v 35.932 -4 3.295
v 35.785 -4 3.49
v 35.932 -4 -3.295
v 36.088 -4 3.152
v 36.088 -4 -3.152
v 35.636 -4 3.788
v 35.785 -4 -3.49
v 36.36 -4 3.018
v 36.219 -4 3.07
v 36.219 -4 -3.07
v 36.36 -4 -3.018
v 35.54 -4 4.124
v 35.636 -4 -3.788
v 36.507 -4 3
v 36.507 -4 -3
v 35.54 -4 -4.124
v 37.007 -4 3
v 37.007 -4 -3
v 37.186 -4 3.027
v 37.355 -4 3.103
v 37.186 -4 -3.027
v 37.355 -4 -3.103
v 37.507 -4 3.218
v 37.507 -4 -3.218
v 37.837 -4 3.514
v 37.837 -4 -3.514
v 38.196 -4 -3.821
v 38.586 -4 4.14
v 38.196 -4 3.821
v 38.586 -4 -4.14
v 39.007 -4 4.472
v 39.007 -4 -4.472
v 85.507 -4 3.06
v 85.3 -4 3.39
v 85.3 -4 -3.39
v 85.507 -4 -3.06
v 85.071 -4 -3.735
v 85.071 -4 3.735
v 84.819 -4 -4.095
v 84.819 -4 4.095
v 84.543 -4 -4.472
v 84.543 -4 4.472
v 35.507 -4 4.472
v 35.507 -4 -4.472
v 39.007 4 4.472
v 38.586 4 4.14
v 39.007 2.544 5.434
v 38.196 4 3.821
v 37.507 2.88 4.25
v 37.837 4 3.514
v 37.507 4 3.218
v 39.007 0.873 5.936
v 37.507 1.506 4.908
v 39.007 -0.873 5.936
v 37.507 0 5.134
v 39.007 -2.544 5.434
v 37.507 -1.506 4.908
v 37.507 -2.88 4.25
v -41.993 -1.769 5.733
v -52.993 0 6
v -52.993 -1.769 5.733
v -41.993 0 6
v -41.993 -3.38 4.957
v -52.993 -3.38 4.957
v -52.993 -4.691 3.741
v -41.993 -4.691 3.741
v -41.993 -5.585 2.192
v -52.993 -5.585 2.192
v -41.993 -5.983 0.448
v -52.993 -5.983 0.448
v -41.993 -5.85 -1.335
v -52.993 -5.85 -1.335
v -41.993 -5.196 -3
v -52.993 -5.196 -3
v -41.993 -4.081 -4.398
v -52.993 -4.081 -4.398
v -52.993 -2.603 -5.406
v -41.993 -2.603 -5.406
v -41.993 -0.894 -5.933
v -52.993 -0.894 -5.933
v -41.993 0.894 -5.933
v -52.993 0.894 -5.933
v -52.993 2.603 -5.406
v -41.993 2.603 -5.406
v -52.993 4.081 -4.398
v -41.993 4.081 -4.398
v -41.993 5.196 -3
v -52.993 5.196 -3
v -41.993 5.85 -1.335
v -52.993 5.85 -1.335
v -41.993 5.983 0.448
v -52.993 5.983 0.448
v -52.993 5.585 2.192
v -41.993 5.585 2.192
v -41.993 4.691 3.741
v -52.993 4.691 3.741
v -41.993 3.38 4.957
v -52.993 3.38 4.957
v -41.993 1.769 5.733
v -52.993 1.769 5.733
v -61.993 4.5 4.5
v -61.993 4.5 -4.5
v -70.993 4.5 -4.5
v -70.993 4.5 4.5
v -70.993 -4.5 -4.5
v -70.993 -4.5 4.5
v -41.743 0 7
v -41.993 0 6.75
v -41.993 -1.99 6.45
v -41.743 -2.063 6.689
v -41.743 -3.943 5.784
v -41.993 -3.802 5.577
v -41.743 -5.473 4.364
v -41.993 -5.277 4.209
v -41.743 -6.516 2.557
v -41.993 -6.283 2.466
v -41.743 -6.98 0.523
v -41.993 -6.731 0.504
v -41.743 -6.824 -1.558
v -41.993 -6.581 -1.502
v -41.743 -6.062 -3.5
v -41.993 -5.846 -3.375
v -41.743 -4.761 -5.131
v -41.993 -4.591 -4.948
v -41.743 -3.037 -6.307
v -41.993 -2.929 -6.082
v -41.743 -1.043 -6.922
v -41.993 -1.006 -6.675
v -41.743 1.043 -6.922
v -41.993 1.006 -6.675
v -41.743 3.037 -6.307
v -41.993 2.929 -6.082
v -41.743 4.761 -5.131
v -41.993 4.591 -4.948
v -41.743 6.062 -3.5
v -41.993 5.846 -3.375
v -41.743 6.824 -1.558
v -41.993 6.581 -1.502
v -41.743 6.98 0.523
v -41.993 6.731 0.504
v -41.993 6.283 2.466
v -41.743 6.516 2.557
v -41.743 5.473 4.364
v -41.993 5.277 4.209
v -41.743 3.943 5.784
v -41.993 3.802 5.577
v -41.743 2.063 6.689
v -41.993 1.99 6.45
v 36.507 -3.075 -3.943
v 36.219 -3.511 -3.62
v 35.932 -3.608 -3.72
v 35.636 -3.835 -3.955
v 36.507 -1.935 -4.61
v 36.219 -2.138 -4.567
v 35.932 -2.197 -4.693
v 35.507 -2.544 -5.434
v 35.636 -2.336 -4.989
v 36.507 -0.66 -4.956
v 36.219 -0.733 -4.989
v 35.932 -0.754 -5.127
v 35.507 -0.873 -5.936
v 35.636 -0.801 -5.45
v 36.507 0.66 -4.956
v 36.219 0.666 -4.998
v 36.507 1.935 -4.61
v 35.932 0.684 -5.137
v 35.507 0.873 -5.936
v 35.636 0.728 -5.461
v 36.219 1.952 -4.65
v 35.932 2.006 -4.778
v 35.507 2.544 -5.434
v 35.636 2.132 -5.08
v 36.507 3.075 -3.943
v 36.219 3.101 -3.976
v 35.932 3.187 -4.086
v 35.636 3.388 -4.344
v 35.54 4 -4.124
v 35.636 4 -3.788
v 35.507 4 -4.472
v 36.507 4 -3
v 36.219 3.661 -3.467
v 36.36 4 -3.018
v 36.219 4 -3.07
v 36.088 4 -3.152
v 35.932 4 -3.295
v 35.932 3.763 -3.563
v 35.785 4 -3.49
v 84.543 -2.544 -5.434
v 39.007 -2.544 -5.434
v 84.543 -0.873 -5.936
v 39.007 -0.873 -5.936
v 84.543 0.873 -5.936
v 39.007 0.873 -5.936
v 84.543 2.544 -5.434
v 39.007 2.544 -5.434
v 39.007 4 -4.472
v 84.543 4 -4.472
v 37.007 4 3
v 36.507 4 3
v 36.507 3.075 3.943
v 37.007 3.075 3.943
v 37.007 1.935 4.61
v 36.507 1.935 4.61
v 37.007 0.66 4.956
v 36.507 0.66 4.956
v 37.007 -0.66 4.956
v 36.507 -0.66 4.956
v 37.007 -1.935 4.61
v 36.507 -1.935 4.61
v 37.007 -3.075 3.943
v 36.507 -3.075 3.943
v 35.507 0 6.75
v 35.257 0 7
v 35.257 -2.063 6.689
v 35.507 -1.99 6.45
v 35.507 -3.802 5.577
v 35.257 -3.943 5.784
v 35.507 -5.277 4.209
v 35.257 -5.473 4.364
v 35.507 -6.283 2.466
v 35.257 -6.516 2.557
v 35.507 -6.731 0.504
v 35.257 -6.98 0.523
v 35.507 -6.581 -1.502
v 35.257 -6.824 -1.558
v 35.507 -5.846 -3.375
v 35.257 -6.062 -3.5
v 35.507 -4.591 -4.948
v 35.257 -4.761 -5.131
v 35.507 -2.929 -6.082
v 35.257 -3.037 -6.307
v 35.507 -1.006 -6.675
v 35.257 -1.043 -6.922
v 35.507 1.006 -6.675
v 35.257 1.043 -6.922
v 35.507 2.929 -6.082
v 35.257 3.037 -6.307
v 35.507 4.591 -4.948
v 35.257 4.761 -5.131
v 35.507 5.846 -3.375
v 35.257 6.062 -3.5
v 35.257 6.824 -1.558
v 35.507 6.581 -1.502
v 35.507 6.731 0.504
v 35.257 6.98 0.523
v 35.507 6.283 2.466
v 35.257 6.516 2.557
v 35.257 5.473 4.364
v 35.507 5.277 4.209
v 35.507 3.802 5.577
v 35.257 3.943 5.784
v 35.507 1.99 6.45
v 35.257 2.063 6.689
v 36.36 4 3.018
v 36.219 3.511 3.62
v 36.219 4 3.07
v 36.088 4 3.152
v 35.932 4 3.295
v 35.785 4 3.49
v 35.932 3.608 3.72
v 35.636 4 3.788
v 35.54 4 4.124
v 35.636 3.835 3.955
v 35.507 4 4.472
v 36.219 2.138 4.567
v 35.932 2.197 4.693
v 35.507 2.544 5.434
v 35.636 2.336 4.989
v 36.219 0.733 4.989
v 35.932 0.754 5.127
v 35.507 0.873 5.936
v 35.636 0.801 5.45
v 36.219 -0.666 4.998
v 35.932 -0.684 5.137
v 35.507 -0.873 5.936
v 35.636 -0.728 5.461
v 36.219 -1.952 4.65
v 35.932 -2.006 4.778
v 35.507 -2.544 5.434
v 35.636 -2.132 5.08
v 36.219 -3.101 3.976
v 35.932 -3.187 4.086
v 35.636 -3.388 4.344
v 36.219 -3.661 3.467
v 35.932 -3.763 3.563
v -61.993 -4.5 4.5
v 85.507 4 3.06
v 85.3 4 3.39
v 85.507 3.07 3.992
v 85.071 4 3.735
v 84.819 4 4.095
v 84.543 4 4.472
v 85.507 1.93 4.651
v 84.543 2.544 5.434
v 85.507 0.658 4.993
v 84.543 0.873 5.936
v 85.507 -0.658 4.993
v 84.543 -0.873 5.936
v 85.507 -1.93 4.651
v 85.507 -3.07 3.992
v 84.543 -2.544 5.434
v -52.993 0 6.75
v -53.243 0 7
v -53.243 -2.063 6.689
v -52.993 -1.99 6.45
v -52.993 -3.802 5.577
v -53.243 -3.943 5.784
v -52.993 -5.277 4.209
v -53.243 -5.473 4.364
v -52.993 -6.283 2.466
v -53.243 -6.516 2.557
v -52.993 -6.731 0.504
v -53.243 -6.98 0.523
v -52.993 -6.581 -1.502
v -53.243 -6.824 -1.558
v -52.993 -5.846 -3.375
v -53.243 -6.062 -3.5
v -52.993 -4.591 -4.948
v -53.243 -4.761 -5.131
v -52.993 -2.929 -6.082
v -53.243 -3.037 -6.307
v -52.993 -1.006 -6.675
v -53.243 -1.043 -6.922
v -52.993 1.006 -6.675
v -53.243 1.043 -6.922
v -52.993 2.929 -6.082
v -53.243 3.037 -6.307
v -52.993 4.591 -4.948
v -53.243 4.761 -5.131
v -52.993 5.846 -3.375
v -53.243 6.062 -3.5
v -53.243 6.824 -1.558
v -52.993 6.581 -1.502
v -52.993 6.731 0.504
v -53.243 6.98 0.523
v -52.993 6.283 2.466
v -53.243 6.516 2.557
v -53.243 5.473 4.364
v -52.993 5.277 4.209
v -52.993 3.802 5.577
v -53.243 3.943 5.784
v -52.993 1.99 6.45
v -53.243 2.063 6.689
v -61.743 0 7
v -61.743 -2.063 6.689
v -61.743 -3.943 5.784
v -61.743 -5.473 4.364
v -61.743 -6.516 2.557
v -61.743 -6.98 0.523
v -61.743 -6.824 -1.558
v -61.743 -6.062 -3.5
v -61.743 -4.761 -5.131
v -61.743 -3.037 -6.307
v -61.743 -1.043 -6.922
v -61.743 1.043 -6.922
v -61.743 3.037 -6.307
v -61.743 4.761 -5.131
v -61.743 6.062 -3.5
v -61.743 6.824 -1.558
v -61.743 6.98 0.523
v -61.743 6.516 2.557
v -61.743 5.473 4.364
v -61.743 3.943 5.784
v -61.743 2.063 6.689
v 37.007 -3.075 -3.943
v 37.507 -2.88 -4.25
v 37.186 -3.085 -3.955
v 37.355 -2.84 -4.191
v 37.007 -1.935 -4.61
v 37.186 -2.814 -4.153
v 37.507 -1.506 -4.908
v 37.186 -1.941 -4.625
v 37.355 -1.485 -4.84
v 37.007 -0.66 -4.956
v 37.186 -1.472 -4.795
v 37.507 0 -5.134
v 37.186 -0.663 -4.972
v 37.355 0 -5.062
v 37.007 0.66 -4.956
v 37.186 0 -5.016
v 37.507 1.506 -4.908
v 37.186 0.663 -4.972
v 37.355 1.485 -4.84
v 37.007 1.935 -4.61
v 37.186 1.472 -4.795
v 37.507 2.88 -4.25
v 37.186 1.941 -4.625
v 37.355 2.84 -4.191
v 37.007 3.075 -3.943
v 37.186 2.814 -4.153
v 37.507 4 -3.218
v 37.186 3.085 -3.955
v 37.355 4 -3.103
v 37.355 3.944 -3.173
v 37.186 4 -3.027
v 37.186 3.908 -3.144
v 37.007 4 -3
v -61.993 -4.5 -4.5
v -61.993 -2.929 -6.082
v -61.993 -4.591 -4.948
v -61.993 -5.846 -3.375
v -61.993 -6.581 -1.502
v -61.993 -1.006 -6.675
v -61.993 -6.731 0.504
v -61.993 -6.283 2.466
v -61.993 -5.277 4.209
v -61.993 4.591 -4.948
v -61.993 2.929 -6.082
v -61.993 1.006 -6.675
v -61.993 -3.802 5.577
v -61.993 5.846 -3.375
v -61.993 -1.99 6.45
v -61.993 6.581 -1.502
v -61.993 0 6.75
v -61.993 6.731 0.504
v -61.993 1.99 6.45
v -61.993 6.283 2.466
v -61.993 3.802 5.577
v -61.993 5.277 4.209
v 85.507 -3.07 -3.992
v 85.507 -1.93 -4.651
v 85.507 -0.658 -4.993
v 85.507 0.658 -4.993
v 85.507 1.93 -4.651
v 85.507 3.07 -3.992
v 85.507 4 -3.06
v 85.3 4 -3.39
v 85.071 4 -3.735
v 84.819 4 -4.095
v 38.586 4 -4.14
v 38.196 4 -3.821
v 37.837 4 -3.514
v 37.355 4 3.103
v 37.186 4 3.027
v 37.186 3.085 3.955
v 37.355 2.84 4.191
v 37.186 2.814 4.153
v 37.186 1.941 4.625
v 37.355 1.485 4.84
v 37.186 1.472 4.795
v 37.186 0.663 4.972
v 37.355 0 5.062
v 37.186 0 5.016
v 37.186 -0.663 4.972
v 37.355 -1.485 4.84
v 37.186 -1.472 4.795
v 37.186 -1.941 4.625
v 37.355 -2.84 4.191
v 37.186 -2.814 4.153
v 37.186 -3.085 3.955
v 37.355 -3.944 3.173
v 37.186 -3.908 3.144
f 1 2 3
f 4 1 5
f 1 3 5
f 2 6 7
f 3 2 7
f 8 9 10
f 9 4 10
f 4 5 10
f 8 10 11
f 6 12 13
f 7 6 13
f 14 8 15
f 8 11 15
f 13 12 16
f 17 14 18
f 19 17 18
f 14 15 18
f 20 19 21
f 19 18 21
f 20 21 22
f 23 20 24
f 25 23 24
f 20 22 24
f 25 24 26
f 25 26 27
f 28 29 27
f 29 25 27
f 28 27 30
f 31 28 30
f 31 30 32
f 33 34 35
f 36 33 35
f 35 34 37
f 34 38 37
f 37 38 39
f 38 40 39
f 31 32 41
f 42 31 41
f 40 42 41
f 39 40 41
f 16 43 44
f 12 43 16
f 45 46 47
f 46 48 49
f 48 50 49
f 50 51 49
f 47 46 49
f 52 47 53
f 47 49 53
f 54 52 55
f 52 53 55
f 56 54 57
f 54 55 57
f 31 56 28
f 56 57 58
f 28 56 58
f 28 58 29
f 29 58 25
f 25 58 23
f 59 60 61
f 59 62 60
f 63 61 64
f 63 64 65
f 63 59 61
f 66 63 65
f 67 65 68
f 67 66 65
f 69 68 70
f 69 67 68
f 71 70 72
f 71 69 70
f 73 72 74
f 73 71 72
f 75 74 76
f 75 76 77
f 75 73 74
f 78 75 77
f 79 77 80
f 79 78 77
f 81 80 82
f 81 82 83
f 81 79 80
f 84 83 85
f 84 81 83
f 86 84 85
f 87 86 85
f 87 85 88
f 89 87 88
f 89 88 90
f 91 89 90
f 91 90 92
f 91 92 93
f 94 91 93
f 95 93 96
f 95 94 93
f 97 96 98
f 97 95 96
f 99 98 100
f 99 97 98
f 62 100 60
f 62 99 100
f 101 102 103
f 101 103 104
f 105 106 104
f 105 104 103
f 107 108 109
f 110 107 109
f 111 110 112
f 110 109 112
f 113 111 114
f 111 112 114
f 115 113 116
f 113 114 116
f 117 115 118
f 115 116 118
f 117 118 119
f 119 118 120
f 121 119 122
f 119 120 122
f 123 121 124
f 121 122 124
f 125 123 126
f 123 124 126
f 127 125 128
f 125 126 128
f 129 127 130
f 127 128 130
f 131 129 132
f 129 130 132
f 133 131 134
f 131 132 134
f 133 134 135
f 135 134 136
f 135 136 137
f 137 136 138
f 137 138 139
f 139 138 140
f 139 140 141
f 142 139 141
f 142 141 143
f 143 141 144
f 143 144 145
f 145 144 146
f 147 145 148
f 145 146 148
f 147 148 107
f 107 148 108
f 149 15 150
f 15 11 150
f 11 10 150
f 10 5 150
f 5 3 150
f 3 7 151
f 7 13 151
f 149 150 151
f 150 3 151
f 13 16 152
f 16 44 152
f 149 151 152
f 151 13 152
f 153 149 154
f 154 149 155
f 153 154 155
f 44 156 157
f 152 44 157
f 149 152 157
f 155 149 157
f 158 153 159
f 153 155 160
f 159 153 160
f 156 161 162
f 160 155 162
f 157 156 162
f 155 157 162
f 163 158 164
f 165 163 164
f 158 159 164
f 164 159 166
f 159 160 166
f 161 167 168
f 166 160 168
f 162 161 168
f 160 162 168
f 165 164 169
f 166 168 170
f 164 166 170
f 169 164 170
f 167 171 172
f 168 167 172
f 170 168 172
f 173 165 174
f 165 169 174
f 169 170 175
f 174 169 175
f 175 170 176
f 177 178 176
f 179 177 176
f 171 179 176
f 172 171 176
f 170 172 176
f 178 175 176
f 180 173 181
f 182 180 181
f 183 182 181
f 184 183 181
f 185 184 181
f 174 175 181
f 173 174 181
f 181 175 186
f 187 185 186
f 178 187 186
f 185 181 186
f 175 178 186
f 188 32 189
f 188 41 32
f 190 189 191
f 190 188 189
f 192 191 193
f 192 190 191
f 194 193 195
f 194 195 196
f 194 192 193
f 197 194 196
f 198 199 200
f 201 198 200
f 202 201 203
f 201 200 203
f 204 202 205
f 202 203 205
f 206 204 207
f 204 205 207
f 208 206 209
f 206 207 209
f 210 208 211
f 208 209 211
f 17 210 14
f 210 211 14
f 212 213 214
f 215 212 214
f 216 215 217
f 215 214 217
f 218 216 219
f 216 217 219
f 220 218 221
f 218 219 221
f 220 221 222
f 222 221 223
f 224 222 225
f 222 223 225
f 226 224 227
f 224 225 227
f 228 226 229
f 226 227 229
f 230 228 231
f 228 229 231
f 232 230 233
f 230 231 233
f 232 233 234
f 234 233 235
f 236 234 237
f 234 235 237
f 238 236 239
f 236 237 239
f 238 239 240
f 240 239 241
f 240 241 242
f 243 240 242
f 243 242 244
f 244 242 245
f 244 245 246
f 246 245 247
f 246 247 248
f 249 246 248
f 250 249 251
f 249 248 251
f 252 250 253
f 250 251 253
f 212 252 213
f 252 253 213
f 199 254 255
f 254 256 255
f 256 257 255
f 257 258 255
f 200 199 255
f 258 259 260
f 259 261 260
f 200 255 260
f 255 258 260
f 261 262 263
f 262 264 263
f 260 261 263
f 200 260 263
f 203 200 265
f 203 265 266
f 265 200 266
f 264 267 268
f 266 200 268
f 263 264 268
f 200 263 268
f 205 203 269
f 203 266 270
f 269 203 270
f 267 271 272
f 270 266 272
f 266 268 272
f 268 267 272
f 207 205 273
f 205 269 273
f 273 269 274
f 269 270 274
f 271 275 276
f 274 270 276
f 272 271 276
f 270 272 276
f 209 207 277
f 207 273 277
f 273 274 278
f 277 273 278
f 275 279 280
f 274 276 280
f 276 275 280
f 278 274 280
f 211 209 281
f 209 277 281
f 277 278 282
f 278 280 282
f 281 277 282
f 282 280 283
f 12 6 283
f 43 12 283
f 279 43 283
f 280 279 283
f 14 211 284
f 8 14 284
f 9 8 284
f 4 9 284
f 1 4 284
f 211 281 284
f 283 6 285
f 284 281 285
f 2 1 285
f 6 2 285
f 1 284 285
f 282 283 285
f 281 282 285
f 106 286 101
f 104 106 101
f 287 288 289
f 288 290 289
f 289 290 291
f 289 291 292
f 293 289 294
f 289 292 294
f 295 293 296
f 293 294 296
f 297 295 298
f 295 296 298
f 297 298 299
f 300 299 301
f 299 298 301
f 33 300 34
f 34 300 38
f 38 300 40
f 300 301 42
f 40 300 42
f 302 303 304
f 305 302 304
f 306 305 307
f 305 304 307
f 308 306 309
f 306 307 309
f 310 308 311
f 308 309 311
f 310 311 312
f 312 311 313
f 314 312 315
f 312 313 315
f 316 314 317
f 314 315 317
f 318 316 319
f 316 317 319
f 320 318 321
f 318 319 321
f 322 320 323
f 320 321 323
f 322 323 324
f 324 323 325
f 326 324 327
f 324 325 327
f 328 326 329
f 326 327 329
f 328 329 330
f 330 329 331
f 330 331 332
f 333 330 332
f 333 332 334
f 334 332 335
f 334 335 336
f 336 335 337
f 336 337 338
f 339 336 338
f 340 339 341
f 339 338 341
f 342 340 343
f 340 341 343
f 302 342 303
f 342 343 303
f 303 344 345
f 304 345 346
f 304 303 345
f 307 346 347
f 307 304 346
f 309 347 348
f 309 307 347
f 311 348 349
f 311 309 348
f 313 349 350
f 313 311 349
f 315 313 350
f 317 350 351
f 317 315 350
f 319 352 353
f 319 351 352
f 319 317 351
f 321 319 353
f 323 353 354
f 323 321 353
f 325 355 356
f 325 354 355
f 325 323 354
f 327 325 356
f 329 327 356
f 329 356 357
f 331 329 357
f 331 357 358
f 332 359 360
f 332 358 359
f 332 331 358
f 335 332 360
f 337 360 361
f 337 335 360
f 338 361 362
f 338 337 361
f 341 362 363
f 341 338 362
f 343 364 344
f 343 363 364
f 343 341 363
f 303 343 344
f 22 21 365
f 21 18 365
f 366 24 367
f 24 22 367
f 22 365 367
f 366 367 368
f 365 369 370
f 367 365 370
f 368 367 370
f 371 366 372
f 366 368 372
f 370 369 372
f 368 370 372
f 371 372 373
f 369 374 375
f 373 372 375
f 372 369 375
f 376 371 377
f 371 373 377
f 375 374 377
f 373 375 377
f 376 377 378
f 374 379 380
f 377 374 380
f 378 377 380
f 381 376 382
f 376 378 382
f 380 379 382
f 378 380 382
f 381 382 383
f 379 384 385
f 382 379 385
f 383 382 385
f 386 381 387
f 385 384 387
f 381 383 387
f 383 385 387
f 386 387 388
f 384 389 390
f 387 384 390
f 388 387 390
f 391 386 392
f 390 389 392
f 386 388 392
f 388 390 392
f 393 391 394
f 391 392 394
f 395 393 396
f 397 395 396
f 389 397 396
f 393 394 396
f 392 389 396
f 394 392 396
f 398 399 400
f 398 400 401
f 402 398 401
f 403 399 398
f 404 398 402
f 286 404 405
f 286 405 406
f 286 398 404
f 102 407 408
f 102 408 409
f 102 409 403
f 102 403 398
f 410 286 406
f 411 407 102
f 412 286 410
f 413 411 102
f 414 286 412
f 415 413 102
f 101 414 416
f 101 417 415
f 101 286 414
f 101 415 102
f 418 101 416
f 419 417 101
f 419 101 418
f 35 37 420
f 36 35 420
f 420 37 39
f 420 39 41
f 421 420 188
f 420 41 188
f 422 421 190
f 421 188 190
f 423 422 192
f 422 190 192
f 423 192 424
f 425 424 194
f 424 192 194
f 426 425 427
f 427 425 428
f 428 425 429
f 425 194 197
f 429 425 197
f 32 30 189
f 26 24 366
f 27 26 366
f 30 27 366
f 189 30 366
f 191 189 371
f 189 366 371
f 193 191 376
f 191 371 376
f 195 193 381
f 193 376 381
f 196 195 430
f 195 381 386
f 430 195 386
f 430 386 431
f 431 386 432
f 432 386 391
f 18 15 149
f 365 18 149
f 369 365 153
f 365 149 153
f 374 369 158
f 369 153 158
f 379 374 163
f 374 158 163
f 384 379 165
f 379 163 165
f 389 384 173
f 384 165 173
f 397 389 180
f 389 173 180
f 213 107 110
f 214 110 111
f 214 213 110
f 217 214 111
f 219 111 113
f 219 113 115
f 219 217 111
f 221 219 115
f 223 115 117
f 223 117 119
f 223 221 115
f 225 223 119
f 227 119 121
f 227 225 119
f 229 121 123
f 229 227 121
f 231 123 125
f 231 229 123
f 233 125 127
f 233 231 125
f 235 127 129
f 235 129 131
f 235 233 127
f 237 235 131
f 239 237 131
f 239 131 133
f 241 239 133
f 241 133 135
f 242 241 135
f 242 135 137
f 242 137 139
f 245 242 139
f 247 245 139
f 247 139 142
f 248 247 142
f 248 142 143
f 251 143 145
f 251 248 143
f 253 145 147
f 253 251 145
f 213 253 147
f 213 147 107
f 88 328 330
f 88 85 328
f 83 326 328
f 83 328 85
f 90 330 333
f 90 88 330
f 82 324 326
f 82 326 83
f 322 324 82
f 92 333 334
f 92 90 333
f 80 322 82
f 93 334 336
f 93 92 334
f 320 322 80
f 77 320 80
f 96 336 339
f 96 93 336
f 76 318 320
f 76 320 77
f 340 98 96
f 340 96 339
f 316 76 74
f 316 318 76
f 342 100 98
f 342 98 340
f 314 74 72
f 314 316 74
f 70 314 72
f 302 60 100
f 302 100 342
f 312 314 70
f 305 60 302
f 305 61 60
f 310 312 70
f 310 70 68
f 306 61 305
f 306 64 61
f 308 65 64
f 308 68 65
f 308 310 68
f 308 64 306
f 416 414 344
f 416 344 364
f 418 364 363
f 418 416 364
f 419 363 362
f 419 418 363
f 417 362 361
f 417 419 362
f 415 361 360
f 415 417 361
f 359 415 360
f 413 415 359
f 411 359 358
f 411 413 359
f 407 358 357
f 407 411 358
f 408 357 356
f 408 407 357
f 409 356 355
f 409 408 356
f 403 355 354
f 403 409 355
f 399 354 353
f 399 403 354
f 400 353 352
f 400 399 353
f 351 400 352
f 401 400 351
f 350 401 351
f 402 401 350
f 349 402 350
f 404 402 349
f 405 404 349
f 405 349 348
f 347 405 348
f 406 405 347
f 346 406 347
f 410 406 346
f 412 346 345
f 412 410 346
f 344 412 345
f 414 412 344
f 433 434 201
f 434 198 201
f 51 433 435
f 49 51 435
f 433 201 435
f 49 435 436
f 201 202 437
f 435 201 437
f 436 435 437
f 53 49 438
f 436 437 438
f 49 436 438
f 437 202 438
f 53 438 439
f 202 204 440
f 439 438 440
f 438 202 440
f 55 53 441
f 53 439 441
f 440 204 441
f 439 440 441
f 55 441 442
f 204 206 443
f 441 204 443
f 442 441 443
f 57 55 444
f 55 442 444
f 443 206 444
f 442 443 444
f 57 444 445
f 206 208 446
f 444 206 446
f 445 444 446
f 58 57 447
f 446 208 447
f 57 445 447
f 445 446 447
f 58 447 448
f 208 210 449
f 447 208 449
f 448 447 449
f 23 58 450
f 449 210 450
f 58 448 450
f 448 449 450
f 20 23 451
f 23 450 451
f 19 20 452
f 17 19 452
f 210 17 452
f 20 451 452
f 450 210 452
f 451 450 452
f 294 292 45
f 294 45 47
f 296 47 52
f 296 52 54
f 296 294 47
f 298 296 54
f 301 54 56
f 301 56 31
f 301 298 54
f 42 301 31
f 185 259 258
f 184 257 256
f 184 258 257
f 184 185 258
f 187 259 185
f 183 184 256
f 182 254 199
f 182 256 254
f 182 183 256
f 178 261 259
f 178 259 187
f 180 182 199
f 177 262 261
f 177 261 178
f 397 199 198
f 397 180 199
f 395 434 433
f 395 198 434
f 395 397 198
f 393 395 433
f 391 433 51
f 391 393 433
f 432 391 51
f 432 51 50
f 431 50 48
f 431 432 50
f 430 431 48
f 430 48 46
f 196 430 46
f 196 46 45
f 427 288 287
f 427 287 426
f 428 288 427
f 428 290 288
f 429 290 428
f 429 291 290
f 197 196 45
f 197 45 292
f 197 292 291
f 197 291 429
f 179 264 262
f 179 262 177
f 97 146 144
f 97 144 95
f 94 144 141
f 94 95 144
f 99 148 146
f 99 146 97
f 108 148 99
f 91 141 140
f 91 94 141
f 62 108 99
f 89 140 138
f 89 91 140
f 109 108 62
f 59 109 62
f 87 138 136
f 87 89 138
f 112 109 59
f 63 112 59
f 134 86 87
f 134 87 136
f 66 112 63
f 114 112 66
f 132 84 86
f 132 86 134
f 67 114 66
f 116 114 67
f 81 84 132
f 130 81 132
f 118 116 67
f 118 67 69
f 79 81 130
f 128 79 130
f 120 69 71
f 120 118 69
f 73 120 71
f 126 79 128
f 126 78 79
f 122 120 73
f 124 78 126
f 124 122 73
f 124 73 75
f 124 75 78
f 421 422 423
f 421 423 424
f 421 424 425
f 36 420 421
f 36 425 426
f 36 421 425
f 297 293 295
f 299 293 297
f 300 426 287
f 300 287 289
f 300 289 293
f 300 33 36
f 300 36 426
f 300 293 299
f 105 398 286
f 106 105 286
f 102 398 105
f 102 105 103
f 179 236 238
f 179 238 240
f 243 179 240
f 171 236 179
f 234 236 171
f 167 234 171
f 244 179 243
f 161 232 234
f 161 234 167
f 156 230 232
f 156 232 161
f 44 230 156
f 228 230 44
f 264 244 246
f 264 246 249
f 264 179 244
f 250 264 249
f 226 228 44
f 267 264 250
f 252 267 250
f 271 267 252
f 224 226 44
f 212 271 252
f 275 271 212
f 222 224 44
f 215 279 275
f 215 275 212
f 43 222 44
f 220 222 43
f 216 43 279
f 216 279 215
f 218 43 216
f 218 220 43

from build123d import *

# Parameters (mm, degrees)
SCHNITT_LINEAR_AUSTRAGEN1_DEPTH      = 87.078562226
SCHNITT_LINEAR_AUSTRAGEN1_DEPTH_BACK = 87.078562226
SKIZZE4_W                            = 136.51116069
SKIZZE4_H                            = 4.996766738
SCHNITT_LINEAR_START                 = -9
SKIZZE5_R                            = 7
SKIZZE5_W                            = 9
SKIZZE5_H                            = 9
SCHNITT_LINEAR_AUSTRAGEN2_DEPTH      = 9
FASE1_SIZE                           = 0.25


# Read off the part's stored shape, not the designer's step: M12 Maschinengewinde Bolzen1
with BuildPart() as part:
    # Skizze2 → Rotation1 (revolve)
    with BuildSketch(Plane.XY, mode=Mode.PRIVATE) as rotation1_sk:
        Polygon((35.507419999, 7), (35.507419999, 6), (85.507419999, 6), (85.507419999, 0), (-70.992580001, 0), (-70.992580001, 7), (-52.992580001, 7), (-52.992580001, 6), (-41.992580001, 6), (-41.992580001, 7), align=None)
    revolve(rotation1_sk.sketch.rotate(Axis((-31.289719626, 0, 0), (1, 0, 0)), 90), axis=Axis((-31.289719626, 0, 0), (1, 0, 0)))

    # M12 Maschinengewinde Bolzen1 outline → M12 Maschinengewinde Bolzen1 (revolve, cut)
    with BuildSketch(Plane.YX):
        with BuildLine():
            Line((6, 39.007419999), (5.133974596, 37.507419999))
            ThreePointArc((5.133974596, 37.507419999), (5.034074174, 37.266239044), (5, 37.007419999))
            Line((5, 37.007419999), (5, 36.507419999))
            ThreePointArc((5, 36.507419999), (5.292893219, 35.800313218), (6, 35.507419999))
            Line((6, 35.507419999), (6, 39.007419999))
        make_face()
        Polygon((5.036, 85.507419999), (6, 84.543419999), (6, 85.507419999), align=None)
    revolve(axis=Axis((0, 0, 0), (1, 0, 0)), mode=Mode.SUBTRACT)

    # Skizze4 → Schnitt-Linear austragen1 (cut, two sides: drawn at the far end of the back side and taken through both)
    with BuildSketch(Plane.XY.offset(-SCHNITT_LINEAR_AUSTRAGEN1_DEPTH_BACK)):
        with Locations((103.763000344, 6.498383369)):
            Rectangle(SKIZZE4_W, SKIZZE4_H)
        with Locations((103.763000344, -6.498383369)):
            Rectangle(SKIZZE4_W, SKIZZE4_H)
    extrude(amount=SCHNITT_LINEAR_AUSTRAGEN1_DEPTH + SCHNITT_LINEAR_AUSTRAGEN1_DEPTH_BACK, mode=Mode.SUBTRACT)

    # Skizze5 → Schnitt-Linear austragen2 (cut)
    with BuildSketch(Plane.ZY.offset(70.992580001).offset(SCHNITT_LINEAR_START)):
        Circle(SKIZZE5_R)
        Rectangle(SKIZZE5_W, SKIZZE5_H, mode=Mode.SUBTRACT)
    extrude(amount=SCHNITT_LINEAR_AUSTRAGEN2_DEPTH, mode=Mode.SUBTRACT)

    # Fase1
    fase1_edges = [part.edges().sort_by_distance(p)[0] for p in [
        (-61.992580001, 0, -7),
        (-41.992580001, 0, -7),
        (-52.992580001, 0, -7),
        (35.507419999, 0, -7),
    ]]
    chamfer(fase1_edges, length=FASE1_SIZE)


solid = part.part
